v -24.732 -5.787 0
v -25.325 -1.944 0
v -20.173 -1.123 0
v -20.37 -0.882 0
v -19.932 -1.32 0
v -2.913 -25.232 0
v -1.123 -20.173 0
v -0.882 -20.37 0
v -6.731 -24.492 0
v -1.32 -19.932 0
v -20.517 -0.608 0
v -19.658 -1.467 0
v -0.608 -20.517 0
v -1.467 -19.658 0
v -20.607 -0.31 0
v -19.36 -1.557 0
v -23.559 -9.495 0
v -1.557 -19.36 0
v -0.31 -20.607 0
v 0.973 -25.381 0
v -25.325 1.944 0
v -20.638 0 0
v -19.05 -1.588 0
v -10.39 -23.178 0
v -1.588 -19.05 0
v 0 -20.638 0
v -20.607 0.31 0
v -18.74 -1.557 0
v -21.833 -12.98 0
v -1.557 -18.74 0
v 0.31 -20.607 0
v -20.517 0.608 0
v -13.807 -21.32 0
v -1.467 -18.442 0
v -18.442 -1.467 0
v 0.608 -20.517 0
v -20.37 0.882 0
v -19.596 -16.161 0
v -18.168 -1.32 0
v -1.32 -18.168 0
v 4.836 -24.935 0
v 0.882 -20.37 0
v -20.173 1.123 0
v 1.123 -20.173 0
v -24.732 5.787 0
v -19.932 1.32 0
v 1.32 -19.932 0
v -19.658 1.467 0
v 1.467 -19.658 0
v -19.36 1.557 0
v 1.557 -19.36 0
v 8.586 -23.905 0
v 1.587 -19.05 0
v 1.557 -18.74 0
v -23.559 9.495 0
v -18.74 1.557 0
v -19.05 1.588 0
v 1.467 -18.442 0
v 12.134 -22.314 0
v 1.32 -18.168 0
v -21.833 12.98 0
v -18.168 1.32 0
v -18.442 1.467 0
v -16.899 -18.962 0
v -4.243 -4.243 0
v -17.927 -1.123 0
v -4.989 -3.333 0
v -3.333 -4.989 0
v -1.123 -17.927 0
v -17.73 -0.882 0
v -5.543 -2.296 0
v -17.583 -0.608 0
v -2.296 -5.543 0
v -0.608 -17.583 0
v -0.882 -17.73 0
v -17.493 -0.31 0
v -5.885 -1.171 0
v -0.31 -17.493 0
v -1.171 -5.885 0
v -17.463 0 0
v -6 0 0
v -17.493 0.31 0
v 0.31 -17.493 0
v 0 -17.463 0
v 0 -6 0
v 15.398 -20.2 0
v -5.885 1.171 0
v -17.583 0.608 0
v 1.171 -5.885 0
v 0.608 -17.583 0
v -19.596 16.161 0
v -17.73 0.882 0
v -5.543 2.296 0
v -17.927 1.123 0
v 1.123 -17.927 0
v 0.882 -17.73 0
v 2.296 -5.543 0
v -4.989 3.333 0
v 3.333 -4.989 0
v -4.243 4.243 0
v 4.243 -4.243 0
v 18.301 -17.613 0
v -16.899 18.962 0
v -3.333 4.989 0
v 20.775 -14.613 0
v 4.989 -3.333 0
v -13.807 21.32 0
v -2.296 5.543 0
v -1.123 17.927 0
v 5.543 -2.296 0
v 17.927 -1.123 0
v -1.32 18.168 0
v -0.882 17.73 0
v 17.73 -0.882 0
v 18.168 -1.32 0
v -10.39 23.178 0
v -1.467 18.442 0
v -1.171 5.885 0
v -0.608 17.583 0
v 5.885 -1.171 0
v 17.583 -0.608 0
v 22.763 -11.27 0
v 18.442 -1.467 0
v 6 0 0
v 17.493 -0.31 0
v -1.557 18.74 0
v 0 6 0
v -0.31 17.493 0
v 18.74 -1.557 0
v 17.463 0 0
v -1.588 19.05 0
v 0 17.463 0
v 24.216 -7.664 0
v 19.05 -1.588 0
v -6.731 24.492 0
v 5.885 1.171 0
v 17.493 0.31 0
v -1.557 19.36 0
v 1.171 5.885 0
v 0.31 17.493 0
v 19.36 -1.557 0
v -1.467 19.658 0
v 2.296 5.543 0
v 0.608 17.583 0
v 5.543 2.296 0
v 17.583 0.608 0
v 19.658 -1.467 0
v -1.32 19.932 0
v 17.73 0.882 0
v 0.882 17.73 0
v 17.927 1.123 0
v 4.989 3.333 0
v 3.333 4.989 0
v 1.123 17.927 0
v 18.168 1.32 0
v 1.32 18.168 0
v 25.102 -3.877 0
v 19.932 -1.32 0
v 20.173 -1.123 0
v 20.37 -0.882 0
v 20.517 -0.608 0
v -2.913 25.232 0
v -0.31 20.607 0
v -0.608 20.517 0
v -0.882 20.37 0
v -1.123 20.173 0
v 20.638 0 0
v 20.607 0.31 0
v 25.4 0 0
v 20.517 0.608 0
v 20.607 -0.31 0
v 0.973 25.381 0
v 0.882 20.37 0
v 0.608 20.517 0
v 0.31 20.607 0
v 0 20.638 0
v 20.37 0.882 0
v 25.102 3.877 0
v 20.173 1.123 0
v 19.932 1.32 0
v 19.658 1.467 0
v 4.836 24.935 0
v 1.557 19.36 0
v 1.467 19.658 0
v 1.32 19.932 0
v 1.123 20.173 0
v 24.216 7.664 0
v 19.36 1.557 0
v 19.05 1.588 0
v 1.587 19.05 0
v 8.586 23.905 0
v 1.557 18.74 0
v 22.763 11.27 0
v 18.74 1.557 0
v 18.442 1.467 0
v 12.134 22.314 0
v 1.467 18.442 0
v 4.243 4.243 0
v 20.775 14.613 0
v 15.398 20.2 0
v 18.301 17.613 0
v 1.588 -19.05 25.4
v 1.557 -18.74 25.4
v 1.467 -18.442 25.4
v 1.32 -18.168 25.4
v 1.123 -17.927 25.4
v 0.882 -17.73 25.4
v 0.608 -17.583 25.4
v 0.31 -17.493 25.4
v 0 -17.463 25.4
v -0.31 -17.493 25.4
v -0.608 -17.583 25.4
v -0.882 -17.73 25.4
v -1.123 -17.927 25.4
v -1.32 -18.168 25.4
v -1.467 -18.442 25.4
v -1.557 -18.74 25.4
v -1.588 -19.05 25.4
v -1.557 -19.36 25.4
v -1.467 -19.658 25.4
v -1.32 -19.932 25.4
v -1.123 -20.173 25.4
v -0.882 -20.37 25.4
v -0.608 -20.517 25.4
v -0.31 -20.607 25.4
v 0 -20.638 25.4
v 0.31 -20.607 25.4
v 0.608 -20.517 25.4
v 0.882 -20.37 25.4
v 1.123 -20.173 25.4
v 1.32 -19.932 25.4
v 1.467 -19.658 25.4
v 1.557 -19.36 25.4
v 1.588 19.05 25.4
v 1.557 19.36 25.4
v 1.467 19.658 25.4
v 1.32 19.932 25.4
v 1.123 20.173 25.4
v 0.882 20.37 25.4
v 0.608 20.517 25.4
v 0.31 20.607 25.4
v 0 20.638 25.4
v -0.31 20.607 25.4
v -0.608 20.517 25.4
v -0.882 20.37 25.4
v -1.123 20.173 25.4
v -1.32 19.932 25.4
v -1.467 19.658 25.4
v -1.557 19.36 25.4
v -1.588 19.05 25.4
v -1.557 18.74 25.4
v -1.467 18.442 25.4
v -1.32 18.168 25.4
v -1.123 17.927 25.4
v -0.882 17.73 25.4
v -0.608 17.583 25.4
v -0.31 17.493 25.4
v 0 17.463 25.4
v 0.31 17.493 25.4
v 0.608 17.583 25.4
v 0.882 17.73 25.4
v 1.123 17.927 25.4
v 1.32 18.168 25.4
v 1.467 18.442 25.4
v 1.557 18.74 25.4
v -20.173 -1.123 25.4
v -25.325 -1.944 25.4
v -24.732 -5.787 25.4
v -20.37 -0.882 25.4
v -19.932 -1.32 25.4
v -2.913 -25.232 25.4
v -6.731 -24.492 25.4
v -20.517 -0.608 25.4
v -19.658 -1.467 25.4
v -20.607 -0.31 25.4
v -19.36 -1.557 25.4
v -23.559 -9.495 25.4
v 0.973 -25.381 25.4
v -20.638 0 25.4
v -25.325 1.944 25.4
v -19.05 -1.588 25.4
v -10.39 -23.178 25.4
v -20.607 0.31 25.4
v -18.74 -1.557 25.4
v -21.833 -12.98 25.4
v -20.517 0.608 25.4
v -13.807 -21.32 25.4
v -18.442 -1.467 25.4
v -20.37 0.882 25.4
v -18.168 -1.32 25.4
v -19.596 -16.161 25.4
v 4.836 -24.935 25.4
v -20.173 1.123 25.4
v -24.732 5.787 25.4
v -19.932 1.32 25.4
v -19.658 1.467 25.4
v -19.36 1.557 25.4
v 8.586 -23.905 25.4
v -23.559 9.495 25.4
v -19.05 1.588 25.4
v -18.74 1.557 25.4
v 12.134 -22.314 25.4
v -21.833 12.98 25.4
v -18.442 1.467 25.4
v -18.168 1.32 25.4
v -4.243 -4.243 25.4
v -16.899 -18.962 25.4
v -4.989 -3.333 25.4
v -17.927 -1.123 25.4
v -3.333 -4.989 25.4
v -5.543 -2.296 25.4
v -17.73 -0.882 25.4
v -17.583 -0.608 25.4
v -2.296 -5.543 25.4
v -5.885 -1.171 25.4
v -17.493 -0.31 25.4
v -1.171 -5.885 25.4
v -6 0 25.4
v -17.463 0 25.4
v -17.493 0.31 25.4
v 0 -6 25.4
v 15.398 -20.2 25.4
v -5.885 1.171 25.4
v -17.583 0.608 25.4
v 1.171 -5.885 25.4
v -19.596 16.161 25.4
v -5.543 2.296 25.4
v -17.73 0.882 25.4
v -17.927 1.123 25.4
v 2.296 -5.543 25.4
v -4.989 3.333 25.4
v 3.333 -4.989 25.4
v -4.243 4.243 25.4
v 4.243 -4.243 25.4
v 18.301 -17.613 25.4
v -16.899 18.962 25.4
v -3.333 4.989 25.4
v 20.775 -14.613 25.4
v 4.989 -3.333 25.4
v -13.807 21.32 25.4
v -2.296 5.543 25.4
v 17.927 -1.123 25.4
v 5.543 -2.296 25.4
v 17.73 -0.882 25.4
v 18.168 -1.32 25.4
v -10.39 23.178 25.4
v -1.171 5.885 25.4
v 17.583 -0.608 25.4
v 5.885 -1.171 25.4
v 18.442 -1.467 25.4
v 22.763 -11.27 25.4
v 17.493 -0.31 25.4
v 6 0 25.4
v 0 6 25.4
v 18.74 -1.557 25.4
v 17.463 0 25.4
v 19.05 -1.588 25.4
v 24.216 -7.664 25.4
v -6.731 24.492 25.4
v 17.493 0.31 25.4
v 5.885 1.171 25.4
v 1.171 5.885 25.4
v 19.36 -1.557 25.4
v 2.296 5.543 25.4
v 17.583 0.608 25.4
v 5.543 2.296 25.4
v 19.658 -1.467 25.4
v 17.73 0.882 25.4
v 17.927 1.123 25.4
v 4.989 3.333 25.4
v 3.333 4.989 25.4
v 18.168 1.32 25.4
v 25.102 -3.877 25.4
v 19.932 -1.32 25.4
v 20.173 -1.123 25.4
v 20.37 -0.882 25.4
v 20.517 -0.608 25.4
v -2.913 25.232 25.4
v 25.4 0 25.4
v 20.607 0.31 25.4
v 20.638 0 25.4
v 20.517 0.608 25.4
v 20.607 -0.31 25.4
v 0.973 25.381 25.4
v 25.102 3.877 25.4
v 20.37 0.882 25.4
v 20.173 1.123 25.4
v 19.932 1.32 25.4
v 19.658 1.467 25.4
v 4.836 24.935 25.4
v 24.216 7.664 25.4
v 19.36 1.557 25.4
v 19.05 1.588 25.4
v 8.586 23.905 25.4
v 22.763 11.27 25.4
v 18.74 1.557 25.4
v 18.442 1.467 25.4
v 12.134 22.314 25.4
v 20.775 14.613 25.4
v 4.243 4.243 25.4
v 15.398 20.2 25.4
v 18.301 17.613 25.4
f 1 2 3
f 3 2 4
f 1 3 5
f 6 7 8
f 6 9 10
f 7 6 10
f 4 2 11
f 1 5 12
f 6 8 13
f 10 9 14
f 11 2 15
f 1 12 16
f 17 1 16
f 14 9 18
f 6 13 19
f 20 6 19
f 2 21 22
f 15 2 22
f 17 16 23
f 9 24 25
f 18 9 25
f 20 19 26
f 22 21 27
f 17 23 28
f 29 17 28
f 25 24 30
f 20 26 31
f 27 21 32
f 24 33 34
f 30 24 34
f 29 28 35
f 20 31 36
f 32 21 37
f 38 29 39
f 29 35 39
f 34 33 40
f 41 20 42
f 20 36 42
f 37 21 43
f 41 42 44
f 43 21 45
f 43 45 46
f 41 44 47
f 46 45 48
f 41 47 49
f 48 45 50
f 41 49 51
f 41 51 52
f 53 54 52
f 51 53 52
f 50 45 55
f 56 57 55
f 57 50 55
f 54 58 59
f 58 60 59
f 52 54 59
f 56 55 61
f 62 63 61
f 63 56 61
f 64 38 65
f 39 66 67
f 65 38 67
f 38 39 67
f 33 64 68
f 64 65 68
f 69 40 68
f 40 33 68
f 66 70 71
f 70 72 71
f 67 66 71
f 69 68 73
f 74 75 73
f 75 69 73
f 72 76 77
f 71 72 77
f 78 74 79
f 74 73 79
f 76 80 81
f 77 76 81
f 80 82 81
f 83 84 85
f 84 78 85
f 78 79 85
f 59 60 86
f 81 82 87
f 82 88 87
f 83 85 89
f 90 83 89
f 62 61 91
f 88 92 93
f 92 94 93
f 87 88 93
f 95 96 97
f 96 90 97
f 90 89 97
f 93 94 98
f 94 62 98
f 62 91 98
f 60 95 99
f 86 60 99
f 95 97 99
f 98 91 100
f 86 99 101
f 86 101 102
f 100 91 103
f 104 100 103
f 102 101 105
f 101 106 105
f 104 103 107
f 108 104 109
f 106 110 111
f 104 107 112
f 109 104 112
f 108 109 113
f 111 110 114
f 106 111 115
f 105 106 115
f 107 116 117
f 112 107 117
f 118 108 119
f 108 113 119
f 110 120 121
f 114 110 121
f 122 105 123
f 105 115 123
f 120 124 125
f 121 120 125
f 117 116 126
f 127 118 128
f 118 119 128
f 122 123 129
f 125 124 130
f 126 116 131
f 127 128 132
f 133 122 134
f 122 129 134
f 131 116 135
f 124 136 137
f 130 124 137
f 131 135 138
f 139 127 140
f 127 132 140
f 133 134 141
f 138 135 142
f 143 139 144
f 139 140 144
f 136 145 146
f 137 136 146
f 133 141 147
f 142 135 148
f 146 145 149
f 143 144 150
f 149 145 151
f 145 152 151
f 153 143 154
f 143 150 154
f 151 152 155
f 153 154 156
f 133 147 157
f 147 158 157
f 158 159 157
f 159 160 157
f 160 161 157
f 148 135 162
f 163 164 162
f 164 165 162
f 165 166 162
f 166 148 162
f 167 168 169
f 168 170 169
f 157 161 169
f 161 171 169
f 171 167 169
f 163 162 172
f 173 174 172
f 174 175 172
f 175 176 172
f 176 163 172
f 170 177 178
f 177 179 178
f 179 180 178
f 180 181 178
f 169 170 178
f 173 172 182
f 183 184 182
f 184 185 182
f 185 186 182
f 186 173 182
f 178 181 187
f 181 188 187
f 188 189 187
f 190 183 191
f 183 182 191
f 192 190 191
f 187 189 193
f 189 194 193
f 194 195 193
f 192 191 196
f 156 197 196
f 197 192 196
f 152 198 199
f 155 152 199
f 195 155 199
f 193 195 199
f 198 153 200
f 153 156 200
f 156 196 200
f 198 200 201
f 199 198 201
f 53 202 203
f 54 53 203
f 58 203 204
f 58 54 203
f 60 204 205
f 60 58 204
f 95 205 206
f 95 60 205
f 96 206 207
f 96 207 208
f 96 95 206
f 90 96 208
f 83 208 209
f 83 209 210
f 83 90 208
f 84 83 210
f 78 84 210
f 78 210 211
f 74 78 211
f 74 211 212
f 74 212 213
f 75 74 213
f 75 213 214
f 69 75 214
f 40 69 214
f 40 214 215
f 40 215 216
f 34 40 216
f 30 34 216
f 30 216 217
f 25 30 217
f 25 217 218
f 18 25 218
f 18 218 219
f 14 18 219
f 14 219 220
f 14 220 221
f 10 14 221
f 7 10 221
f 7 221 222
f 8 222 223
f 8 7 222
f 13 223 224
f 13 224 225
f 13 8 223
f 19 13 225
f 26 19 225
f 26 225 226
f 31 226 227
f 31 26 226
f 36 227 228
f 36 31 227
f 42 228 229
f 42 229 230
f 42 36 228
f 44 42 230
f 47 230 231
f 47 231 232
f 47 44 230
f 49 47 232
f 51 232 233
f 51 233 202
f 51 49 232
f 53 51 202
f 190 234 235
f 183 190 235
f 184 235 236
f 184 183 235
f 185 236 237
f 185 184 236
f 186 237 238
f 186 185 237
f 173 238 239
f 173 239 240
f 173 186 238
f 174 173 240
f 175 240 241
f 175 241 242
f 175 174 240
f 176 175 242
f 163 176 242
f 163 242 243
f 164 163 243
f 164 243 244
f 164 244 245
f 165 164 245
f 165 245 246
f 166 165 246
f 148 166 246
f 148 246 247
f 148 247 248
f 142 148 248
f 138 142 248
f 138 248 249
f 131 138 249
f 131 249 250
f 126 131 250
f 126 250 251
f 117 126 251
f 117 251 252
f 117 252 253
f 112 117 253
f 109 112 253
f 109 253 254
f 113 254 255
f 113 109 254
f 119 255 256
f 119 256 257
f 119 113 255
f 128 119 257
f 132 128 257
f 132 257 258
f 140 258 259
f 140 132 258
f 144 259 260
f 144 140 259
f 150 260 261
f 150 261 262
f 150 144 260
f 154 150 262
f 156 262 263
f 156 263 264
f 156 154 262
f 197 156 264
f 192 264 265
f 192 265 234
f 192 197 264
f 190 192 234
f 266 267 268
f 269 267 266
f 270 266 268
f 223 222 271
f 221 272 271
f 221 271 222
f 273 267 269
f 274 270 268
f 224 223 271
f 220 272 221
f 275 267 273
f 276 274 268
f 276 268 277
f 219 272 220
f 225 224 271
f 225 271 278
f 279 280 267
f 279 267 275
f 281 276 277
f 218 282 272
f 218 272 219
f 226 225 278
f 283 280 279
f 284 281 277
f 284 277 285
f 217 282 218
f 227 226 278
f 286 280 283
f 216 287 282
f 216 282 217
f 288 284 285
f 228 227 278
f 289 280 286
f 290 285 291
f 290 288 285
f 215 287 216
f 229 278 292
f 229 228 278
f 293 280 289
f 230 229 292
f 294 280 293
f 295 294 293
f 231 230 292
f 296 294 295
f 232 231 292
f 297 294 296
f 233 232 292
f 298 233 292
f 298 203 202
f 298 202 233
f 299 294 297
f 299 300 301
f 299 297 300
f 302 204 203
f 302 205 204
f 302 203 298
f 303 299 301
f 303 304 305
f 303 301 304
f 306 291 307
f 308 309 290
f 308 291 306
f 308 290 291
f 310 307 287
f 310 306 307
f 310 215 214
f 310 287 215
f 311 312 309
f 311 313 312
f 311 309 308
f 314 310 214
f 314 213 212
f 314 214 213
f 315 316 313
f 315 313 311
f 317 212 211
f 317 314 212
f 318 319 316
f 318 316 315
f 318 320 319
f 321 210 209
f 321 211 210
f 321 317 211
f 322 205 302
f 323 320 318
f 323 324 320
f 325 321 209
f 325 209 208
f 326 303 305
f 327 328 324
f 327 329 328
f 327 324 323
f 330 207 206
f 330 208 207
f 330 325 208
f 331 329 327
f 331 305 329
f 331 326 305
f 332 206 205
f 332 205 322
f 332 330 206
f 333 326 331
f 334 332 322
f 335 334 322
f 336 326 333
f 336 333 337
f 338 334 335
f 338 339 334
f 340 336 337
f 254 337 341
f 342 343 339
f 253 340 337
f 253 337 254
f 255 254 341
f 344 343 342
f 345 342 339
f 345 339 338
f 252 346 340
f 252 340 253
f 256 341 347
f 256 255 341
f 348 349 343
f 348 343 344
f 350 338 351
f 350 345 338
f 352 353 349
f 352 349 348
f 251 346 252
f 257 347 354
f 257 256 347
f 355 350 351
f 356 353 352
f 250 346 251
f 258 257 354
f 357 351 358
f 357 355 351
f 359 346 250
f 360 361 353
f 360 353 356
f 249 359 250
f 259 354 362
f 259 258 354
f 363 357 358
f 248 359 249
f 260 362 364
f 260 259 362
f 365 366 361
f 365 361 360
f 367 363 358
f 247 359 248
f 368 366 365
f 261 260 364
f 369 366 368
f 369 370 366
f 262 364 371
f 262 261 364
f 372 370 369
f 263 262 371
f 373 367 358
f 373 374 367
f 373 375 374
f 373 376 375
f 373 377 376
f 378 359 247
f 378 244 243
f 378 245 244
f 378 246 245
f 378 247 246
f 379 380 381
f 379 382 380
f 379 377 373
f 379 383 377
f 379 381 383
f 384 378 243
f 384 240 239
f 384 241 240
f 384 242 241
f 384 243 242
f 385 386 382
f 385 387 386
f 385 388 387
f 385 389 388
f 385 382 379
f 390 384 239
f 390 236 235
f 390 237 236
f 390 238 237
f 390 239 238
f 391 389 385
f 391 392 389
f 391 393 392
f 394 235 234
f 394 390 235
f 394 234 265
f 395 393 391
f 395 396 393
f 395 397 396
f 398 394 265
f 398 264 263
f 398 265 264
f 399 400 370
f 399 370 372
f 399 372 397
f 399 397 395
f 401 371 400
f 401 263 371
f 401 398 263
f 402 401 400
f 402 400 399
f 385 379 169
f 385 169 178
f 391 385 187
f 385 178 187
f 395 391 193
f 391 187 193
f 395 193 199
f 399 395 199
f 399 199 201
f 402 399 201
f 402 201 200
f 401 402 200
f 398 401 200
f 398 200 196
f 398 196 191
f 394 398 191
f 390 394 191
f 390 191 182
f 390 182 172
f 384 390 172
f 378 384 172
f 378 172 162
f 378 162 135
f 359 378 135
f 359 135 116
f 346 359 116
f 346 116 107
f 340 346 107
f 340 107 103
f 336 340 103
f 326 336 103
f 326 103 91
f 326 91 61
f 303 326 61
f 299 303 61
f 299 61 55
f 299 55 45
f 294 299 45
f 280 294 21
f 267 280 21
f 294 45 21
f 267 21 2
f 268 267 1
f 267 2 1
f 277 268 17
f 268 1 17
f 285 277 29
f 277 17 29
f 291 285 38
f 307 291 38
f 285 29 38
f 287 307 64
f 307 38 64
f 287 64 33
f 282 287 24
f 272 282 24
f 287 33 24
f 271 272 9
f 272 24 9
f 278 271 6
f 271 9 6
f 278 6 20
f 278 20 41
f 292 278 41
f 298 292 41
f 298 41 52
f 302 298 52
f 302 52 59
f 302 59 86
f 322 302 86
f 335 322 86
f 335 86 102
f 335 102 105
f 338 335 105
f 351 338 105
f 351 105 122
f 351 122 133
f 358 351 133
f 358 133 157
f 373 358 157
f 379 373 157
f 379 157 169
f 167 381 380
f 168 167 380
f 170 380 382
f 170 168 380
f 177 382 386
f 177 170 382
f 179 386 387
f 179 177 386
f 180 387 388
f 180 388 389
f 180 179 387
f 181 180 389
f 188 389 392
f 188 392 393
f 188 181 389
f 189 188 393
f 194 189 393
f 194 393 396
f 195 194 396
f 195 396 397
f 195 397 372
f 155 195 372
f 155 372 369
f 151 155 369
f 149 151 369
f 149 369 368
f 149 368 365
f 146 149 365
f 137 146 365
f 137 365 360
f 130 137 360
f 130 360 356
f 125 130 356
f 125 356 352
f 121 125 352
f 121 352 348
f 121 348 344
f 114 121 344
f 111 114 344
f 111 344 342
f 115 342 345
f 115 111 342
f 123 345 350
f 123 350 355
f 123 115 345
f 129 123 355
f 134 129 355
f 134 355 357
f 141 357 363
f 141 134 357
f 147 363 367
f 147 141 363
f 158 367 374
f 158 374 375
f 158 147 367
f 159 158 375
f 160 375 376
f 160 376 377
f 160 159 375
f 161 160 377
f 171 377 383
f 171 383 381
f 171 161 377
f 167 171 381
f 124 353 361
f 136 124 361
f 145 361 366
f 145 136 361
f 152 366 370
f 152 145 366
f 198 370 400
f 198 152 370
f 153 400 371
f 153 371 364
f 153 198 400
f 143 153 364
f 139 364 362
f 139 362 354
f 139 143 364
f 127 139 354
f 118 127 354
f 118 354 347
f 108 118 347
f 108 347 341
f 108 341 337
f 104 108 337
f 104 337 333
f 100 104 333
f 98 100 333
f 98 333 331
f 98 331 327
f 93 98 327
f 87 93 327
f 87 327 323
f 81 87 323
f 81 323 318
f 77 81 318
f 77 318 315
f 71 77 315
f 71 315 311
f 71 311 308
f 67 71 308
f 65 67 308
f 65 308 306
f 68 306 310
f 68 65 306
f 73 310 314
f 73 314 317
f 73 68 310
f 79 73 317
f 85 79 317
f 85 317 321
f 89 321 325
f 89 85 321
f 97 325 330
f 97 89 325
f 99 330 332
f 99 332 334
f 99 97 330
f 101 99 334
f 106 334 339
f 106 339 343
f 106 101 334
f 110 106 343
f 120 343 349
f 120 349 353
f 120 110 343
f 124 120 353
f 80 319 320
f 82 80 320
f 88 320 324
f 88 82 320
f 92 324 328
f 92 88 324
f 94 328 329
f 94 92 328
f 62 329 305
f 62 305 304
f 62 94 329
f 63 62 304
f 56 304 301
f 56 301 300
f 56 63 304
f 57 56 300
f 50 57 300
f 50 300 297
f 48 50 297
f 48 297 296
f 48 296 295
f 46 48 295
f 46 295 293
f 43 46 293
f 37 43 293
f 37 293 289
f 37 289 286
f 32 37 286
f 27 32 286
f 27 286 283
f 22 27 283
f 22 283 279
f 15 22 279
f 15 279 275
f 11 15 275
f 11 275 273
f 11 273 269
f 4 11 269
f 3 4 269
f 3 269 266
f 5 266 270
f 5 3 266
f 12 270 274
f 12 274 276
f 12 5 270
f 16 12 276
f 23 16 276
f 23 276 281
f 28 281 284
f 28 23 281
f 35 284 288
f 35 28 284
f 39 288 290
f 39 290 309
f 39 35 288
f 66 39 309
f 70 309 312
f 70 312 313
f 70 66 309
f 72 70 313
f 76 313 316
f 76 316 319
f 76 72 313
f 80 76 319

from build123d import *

# Parameters (mm, degrees)
F0_R     = 25.4
F0_R_2   = 1.5875
F0_R_3   = 6
F1_DEPTH = 19.05
F2_DEPTH = 25.4


with BuildPart() as f1:
    # F0 (on Top) → F1 (new body)
    with BuildSketch(Plane.XY):
        Circle(F0_R)
        with Locations((0, -19.05)):
            Circle(F0_R_2, mode=Mode.SUBTRACT)
        with Locations((-19.05, 0)):
            Circle(F0_R_2, mode=Mode.SUBTRACT)
        Circle(F0_R_3, mode=Mode.SUBTRACT)
        with Locations((19.05, 0)):
            Circle(F0_R_2, mode=Mode.SUBTRACT)
        with Locations((0, 19.05)):
            Circle(F0_R_2, mode=Mode.SUBTRACT)
    extrude(amount=F1_DEPTH)

    # F0 (on Top) → F2 (join)
    with BuildSketch(Plane.XY):
        Circle(F0_R)
        with Locations((0, -19.05)):
            Circle(F0_R_2, mode=Mode.SUBTRACT)
        with Locations((-19.05, 0)):
            Circle(F0_R_2, mode=Mode.SUBTRACT)
        Circle(F0_R_3, mode=Mode.SUBTRACT)
        with Locations((19.05, 0)):
            Circle(F0_R_2, mode=Mode.SUBTRACT)
        with Locations((0, 19.05)):
            Circle(F0_R_2, mode=Mode.SUBTRACT)
    extrude(amount=F2_DEPTH)


solid = f1.part
